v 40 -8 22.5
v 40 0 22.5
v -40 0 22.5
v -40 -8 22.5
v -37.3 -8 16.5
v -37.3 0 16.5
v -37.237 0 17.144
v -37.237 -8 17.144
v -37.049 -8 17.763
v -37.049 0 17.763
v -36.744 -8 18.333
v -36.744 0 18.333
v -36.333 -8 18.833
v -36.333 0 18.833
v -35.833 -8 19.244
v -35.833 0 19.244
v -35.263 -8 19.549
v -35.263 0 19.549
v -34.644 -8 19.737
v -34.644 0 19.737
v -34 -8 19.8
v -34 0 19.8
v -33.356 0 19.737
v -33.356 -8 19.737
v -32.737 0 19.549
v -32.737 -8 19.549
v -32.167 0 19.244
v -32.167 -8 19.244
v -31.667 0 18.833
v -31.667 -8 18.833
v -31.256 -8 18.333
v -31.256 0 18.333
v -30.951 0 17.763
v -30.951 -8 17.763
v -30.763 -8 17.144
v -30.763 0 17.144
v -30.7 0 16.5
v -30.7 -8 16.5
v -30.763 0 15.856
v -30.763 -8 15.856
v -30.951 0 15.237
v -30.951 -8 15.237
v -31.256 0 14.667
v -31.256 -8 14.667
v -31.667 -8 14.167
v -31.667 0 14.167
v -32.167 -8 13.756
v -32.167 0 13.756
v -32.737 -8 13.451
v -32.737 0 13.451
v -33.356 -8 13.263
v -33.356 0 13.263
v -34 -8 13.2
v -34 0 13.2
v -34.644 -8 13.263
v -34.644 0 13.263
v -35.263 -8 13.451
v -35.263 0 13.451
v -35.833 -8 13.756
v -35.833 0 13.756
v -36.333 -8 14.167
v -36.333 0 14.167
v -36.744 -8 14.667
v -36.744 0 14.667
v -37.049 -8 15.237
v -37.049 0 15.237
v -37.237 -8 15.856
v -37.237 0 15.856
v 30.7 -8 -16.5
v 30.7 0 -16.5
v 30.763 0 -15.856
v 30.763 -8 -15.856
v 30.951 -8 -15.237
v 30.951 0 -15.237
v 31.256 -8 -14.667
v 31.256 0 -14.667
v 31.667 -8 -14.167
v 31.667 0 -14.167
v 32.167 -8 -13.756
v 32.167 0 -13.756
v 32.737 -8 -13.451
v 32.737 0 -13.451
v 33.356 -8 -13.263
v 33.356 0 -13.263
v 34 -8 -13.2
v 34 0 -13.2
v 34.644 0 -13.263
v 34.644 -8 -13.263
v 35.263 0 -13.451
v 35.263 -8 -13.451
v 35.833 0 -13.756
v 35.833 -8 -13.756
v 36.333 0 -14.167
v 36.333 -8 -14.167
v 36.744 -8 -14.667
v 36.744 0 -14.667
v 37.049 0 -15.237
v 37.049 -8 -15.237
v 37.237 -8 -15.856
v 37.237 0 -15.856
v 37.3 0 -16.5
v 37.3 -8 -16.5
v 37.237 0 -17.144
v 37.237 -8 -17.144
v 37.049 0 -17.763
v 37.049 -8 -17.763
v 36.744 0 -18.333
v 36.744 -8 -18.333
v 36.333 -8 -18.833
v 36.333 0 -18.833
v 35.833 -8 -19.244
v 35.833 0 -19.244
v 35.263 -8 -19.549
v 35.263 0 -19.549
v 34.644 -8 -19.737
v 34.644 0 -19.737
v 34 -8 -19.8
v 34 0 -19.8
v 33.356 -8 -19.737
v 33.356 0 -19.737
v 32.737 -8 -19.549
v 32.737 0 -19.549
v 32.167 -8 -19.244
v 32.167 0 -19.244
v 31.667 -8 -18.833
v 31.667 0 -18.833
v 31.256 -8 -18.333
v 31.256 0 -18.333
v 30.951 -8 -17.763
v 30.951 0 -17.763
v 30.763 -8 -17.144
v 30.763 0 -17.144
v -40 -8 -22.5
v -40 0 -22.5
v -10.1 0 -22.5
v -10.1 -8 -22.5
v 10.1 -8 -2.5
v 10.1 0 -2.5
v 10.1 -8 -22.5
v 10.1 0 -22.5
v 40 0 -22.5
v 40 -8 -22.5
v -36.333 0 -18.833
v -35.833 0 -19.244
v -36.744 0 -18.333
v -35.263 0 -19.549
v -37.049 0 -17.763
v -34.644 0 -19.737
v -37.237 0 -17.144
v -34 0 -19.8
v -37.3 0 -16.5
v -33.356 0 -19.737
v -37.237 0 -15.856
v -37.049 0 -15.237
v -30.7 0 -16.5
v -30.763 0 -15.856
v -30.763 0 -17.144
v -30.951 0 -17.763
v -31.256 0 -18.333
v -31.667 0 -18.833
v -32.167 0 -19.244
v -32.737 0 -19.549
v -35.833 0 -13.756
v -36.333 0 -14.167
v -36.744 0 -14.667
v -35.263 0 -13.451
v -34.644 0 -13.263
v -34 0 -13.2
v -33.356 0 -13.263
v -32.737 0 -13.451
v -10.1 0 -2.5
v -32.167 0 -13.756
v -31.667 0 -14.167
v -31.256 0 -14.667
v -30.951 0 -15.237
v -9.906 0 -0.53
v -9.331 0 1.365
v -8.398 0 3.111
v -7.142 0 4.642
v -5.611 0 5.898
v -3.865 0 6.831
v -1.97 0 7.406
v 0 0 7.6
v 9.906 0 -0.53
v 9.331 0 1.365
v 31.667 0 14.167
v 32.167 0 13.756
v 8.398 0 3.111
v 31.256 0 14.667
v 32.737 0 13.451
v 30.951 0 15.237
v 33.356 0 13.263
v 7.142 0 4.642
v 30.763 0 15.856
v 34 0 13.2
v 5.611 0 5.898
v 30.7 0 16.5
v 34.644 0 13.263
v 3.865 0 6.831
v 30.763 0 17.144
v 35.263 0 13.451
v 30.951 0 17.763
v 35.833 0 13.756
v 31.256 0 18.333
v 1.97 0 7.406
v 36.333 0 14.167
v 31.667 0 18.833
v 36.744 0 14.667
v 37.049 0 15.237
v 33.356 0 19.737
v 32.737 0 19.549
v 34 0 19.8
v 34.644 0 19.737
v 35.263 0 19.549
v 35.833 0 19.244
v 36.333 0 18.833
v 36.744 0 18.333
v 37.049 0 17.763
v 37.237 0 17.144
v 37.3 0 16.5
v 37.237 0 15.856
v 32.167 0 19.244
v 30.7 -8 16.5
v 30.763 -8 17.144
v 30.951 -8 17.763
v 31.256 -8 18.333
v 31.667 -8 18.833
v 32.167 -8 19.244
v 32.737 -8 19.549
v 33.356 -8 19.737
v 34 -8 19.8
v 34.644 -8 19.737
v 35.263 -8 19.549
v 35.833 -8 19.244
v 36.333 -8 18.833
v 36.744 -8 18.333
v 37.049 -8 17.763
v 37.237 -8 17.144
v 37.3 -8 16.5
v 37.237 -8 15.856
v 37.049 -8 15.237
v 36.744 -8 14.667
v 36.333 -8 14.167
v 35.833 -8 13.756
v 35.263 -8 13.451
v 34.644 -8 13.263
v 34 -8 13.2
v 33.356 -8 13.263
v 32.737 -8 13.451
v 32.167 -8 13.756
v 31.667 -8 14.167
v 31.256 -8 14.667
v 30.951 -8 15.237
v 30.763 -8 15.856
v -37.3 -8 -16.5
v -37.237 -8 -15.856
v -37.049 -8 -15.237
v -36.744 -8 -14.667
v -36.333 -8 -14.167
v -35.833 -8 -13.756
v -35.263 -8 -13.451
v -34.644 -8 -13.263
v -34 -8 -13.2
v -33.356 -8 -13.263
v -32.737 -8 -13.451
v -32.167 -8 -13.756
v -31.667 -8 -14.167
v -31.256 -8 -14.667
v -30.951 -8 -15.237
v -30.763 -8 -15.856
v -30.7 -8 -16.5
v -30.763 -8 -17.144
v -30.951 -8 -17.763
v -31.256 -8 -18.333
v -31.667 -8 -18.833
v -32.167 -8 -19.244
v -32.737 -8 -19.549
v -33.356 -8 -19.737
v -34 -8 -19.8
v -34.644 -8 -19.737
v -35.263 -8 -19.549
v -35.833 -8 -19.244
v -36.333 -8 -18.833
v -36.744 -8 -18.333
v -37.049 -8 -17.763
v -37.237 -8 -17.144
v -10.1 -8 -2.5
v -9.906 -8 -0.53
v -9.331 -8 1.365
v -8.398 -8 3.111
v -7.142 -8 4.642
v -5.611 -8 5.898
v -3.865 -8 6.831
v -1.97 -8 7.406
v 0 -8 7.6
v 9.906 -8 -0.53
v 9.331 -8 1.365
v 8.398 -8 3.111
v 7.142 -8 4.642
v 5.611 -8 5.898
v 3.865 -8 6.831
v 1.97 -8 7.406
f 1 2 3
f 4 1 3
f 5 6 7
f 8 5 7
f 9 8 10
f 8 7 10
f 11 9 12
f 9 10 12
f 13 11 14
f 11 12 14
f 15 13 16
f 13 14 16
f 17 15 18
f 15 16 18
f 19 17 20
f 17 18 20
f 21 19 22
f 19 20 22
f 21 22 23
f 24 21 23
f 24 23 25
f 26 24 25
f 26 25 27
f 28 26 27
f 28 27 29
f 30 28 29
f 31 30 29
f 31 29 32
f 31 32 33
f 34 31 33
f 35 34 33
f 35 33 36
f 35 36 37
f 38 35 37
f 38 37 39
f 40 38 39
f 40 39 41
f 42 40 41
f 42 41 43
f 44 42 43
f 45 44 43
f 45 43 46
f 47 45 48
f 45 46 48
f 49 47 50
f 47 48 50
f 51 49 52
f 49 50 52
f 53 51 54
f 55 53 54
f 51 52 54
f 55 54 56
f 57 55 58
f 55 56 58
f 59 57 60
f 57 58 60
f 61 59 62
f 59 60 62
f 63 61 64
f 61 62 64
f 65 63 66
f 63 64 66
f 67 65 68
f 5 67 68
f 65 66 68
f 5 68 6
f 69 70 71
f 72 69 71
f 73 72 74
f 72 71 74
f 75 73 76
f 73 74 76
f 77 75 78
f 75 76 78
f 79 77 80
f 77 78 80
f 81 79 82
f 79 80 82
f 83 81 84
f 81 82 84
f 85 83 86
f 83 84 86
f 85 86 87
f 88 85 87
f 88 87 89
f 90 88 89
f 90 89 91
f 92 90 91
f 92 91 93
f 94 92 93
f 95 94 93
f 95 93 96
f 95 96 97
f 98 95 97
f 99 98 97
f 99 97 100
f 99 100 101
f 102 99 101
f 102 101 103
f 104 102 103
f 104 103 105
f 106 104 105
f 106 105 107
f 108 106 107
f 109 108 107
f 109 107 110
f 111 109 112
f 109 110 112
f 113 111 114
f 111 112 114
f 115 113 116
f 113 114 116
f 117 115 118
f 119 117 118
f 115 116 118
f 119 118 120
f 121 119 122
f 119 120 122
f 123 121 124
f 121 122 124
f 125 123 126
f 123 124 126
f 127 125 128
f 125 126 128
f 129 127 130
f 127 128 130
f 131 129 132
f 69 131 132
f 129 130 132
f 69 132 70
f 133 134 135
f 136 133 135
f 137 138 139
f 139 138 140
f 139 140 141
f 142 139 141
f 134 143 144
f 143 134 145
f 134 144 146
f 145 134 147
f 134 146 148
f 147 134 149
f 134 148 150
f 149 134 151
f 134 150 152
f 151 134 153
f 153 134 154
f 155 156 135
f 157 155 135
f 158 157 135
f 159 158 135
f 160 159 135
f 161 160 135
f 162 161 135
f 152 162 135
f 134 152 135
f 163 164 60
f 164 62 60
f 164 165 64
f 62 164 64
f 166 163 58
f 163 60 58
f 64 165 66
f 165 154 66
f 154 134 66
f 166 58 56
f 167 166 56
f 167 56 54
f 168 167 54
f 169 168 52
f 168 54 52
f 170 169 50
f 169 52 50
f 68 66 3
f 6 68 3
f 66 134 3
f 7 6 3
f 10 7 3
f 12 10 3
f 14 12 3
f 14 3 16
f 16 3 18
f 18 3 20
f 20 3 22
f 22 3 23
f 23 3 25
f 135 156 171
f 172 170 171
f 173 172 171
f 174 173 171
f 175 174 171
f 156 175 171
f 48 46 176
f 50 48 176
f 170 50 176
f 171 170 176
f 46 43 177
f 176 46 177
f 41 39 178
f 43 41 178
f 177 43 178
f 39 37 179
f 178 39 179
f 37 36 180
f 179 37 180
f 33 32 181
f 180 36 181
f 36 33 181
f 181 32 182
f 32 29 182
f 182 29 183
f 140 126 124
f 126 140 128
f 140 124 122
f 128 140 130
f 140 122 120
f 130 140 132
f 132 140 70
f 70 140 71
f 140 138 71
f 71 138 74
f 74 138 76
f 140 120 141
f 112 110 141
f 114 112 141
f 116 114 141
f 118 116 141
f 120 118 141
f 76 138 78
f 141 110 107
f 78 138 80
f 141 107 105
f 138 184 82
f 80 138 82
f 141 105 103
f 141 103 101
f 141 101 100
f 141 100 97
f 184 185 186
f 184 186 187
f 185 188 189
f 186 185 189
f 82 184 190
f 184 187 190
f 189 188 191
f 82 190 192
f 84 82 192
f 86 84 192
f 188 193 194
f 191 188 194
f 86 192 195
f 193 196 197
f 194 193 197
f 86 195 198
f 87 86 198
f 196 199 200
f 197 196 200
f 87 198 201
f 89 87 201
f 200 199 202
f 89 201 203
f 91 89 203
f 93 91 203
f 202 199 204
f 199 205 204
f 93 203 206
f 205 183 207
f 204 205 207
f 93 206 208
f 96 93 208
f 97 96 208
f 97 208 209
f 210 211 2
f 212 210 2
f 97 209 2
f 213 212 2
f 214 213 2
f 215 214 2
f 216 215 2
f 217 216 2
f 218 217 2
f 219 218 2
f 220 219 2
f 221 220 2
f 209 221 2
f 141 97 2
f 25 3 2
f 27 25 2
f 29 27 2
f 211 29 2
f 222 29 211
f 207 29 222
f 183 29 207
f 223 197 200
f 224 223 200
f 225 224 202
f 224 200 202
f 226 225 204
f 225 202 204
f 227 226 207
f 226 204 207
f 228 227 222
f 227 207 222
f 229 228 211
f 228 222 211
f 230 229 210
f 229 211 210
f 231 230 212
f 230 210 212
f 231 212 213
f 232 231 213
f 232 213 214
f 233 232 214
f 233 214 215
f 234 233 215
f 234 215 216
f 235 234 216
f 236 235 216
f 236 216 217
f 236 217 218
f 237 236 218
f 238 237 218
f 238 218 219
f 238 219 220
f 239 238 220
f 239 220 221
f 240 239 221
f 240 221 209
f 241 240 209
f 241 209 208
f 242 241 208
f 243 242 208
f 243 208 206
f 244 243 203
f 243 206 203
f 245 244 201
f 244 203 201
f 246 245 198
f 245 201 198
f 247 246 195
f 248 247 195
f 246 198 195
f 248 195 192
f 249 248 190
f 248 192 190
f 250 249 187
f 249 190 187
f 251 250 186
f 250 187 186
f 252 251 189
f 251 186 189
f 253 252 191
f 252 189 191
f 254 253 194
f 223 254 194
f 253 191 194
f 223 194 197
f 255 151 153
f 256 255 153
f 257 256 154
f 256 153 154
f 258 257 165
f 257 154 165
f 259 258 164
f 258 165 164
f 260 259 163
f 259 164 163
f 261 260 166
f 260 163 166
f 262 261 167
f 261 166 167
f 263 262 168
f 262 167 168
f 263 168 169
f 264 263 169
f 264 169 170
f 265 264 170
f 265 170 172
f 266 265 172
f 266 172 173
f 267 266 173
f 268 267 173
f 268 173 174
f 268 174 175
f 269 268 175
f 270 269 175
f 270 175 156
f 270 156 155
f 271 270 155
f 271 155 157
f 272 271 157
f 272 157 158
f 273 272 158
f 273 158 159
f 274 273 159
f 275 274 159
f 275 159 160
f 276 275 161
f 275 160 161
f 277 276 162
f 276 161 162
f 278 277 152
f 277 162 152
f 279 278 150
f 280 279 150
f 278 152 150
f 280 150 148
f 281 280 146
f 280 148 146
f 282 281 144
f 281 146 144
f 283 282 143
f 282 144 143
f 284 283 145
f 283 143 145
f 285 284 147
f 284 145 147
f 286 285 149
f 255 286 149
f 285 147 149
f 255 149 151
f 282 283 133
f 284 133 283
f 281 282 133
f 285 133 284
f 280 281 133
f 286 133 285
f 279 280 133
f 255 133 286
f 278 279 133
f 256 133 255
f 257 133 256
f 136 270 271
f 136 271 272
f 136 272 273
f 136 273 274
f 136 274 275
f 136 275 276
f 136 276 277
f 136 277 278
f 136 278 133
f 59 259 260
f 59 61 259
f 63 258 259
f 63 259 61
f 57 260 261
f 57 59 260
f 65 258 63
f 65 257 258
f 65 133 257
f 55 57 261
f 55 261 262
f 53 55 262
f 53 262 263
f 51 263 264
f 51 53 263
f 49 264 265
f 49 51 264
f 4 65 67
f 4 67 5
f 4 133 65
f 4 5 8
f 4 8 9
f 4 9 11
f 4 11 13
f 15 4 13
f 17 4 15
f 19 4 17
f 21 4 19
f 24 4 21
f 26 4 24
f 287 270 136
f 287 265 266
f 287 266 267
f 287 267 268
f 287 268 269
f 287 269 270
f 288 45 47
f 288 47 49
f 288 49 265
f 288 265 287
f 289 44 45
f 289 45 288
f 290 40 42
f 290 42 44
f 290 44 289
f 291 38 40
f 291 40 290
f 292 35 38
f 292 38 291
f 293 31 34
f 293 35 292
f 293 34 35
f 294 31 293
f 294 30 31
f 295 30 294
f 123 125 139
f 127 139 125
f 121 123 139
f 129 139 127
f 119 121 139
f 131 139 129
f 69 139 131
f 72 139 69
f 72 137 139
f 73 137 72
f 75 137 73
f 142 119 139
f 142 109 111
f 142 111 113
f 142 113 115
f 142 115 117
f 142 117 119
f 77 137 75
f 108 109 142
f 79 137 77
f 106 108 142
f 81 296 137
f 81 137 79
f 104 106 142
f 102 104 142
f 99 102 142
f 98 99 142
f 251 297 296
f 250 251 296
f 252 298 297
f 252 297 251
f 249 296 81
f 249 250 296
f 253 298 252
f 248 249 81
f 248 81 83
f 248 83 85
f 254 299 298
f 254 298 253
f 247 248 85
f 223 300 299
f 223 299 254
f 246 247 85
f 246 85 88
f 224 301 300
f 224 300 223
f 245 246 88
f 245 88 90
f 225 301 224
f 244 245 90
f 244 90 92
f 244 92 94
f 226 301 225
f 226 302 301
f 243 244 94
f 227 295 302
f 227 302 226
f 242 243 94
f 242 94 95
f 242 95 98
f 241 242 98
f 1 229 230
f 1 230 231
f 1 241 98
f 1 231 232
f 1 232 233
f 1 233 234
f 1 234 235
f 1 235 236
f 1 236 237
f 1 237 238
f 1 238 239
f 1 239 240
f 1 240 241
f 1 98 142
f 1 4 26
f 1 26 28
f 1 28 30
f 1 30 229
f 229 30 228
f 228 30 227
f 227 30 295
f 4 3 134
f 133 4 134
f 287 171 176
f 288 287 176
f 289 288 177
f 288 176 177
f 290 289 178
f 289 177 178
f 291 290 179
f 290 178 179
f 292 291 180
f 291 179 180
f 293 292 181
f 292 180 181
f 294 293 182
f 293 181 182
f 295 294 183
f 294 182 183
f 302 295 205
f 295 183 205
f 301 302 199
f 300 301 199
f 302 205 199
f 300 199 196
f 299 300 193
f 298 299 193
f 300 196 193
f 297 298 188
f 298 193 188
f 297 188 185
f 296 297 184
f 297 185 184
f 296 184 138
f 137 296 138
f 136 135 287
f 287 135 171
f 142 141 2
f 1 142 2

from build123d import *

# Parameters (mm, degrees)
F1_DEPTH = 8
F3_D     = 6.6


with BuildPart() as f1:
    # F0 (on Front) → F1 (new body)
    with BuildSketch(Plane.XZ):
        with BuildLine():
            Line((40, 22.5), (-40, 22.5))
            Line((-40, 22.5), (-40, -22.5))
            Line((-40, -22.5), (-10.1, -22.5))
            Line((-10.1, -22.5), (-10.1, -2.5))
            ThreePointArc((-10.1, -2.5), (0, 7.6), (10.1, -2.5))
            Line((10.1, -2.5), (10.1, -22.5))
            Line((10.1, -22.5), (40, -22.5))
            Line((40, -22.5), (40, 22.5))
        make_face()
    extrude(amount=F1_DEPTH)

    # F3 (through all)
    with Locations(Plane.XZ.offset(8)):
        with Locations((-34, 16.5), (-34, -16.5), (34, -16.5), (34, 16.5)):
            Hole(F3_D / 2)


solid = f1.part
